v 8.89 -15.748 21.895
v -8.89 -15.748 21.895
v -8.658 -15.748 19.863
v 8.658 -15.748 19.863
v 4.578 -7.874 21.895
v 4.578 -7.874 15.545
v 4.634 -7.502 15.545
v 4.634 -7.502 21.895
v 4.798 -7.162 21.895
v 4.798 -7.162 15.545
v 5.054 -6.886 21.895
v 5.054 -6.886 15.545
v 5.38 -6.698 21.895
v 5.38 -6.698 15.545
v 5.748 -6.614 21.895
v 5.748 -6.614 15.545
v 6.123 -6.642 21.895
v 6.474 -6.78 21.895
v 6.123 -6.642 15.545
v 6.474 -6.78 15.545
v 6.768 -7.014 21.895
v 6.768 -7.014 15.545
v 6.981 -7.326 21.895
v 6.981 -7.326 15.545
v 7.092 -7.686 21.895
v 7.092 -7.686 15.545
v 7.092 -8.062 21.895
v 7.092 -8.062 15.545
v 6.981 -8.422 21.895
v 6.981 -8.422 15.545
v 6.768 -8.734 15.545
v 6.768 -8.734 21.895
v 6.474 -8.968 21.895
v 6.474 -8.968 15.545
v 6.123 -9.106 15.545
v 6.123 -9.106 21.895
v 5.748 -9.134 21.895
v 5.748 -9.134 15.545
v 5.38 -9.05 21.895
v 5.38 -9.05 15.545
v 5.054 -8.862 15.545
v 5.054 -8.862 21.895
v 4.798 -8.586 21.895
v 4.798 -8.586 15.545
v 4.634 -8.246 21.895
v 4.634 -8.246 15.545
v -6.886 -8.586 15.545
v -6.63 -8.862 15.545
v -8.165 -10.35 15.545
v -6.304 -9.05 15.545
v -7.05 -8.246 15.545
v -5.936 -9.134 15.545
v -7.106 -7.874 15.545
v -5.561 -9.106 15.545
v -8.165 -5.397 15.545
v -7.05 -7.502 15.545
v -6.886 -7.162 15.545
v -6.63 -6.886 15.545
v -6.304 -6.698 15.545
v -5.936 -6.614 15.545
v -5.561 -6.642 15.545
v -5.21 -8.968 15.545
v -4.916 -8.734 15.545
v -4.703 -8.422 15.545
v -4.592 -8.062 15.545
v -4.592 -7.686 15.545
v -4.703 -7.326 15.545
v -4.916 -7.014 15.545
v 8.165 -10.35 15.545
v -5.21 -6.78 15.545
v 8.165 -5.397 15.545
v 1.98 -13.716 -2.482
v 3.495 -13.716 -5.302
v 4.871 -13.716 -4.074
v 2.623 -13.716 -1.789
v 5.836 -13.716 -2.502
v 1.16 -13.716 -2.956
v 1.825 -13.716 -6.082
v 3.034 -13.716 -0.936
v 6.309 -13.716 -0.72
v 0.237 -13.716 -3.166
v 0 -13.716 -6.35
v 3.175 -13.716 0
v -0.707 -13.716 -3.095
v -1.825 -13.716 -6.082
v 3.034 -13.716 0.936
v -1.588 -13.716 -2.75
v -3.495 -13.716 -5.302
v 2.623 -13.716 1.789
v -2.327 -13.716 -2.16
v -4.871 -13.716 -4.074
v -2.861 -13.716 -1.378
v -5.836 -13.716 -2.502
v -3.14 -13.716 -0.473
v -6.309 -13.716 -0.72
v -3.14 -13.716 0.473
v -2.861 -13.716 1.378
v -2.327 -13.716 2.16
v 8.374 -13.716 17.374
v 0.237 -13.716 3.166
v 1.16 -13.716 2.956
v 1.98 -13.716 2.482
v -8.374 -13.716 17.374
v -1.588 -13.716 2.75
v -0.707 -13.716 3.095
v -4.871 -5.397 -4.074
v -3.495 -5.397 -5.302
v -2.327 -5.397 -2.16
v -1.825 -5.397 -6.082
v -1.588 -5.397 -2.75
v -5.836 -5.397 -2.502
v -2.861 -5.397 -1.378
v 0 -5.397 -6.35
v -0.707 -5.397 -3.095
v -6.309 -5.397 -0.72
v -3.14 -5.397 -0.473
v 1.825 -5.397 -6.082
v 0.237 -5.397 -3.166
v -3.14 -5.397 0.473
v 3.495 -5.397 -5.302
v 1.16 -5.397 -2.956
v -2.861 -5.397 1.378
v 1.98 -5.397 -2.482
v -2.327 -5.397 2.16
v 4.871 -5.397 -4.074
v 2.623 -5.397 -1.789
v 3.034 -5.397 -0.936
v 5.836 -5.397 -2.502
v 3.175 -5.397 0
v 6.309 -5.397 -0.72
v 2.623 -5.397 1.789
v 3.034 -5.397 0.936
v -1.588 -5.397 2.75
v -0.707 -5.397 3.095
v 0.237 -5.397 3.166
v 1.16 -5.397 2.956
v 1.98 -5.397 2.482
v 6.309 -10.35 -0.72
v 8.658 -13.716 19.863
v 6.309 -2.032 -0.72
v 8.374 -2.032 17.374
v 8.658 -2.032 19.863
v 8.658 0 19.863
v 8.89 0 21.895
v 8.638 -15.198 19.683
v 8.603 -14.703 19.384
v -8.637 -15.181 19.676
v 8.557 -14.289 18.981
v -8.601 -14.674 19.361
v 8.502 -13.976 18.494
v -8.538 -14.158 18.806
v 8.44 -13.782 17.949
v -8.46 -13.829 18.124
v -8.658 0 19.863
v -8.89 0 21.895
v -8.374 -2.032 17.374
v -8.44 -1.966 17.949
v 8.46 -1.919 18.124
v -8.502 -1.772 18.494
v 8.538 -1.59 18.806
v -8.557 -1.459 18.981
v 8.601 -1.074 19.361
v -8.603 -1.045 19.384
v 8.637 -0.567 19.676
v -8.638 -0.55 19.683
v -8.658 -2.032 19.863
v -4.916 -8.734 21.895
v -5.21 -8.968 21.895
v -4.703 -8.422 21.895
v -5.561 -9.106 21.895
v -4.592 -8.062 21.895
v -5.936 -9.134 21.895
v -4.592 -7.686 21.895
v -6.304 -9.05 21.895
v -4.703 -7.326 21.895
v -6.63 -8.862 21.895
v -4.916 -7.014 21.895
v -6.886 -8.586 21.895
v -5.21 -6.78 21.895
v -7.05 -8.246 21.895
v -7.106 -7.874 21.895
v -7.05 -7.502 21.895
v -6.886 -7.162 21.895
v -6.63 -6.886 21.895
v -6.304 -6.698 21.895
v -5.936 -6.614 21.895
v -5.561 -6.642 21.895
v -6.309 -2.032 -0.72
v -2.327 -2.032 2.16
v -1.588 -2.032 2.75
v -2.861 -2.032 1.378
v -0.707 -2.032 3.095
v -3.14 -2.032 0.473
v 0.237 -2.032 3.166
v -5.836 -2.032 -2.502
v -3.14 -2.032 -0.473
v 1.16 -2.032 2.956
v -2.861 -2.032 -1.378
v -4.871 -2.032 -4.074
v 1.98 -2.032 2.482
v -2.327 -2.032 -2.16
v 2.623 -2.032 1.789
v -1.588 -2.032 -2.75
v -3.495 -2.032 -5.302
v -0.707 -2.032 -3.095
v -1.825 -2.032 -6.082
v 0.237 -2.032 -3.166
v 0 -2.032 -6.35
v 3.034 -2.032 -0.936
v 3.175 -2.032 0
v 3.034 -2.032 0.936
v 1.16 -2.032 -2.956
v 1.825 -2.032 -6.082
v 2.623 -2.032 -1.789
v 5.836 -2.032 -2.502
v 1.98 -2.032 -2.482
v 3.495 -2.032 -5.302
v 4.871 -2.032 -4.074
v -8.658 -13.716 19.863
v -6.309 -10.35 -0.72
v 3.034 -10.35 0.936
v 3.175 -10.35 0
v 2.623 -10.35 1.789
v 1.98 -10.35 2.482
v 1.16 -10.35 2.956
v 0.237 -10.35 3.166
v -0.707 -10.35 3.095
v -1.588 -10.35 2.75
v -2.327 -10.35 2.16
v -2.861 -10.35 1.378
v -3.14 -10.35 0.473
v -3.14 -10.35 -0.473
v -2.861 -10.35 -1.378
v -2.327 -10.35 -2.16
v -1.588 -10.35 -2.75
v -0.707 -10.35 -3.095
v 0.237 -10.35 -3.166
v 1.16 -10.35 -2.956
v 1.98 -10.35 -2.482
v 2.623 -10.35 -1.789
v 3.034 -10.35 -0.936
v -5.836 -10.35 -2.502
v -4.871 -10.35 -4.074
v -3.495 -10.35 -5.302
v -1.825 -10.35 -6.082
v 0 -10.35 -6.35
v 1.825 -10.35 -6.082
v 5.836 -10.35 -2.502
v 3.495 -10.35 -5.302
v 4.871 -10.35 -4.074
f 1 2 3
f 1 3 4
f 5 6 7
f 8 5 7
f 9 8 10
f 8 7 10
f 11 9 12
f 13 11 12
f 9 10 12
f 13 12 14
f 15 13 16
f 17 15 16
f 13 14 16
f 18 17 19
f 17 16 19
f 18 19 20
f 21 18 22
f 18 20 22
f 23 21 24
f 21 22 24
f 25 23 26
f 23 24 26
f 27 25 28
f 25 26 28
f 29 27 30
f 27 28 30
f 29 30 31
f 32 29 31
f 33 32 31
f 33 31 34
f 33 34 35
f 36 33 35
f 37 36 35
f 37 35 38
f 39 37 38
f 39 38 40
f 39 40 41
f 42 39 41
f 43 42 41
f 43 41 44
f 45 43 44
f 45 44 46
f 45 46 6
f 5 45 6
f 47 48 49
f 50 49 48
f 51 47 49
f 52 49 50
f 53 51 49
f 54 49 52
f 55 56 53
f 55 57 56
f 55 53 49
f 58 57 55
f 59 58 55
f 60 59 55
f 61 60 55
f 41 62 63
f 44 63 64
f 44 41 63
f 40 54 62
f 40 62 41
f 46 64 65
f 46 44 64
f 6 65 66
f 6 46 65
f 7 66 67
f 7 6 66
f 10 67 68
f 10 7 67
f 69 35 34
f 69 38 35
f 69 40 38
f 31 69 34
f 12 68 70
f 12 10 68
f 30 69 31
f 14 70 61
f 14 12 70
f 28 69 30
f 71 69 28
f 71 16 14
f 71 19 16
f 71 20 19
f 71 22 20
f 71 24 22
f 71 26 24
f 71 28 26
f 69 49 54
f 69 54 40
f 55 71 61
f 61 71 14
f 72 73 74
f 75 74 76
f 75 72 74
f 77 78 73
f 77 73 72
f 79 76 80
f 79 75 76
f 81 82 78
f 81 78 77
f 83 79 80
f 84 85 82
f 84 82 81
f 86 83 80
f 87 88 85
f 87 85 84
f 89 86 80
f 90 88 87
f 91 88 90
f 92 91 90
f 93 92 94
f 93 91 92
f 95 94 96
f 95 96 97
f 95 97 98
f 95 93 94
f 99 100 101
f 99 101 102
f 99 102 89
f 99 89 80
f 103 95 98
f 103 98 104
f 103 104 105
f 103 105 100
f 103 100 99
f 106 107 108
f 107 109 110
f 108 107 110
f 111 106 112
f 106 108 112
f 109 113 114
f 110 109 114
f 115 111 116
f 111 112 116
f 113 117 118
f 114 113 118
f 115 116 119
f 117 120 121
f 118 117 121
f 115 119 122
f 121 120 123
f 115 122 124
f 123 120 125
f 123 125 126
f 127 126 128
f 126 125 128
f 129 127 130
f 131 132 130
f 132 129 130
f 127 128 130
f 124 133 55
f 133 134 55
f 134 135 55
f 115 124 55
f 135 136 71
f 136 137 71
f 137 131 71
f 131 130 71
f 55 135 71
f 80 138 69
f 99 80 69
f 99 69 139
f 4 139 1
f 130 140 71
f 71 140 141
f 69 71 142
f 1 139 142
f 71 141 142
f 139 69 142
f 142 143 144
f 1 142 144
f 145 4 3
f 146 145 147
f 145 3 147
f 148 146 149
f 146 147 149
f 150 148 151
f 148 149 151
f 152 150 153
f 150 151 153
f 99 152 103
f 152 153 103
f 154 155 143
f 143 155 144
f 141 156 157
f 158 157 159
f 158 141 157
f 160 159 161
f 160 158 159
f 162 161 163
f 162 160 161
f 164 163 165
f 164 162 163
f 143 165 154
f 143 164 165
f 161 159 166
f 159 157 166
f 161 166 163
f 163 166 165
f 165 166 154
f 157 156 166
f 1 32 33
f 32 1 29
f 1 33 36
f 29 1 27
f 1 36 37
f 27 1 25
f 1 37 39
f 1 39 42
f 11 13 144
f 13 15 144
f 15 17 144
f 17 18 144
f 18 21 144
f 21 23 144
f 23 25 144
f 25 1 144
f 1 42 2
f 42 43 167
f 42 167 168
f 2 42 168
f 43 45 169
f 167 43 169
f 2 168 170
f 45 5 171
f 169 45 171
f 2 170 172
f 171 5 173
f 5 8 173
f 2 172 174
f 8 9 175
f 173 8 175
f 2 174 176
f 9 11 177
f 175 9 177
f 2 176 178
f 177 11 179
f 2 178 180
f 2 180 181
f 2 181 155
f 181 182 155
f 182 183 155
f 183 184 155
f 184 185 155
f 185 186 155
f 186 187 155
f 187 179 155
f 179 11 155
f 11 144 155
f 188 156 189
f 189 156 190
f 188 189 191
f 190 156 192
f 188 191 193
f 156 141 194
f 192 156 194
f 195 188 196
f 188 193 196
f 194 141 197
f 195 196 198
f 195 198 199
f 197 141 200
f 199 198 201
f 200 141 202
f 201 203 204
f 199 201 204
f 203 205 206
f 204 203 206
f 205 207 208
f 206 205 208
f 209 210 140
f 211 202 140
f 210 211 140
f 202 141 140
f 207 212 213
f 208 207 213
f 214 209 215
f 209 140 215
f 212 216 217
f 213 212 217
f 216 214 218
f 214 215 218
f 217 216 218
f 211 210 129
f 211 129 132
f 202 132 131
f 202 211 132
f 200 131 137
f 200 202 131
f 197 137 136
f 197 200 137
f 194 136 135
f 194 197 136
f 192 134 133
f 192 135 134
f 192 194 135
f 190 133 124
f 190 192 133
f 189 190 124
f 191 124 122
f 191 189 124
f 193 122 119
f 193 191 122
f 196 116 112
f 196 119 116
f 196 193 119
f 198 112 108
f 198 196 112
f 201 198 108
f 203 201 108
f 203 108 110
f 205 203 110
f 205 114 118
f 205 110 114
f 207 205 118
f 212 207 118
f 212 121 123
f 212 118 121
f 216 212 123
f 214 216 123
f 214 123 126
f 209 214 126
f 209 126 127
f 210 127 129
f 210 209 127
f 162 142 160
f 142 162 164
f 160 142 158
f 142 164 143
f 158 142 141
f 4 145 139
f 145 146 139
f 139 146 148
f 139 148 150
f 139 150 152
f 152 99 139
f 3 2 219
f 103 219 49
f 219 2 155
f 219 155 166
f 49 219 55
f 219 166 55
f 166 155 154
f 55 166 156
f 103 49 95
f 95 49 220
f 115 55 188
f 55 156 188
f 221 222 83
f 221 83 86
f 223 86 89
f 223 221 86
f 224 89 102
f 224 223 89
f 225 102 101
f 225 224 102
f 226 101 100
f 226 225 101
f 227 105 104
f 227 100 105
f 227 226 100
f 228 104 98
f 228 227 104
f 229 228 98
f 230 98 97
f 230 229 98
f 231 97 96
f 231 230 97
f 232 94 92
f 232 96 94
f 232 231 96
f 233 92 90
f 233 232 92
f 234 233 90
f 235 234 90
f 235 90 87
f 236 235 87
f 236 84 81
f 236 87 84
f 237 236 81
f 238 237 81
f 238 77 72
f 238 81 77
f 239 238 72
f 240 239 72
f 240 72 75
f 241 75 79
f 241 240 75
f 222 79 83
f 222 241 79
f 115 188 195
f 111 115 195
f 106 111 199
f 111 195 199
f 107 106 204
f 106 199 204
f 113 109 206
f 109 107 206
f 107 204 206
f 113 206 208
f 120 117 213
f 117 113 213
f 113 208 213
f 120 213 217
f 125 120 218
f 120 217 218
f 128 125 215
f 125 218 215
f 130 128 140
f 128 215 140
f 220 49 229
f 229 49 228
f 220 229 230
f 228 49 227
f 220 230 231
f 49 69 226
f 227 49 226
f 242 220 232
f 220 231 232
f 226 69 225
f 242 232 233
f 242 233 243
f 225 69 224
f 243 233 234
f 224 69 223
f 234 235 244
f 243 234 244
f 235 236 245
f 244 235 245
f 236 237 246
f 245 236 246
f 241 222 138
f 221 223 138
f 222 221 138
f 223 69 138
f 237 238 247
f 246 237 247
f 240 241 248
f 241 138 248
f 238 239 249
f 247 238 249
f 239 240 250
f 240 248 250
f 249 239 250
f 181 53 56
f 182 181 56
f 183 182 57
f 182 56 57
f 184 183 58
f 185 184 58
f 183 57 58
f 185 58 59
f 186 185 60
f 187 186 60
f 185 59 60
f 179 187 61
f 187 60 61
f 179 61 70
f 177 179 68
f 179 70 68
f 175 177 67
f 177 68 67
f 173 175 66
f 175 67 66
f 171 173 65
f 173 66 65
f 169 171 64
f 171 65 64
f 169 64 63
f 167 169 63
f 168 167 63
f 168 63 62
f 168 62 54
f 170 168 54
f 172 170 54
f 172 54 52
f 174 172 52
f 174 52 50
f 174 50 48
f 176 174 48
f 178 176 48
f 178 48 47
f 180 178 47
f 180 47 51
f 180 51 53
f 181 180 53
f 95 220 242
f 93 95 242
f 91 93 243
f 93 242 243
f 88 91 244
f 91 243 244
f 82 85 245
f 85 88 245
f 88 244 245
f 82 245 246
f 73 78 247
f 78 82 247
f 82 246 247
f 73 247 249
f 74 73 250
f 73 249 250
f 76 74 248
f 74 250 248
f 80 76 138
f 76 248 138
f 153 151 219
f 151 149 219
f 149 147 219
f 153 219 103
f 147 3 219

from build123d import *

# Parameters (mm, degrees)
F0_R         = 3.175
F1_DEPTH     = 15.748
F2_W         = 4.953
F2_H         = 16.2648302115
F2_H_2       = 7.994236929
F3_DEPTH     = 12.7
F2_W_2       = 2.032
F2_H_3       = 20.5828301237
F4_DEPTH     = 12.7
F5_T4_DEPTH  = 29.7595972634
F5_T10_DEPTH = 29.7595972634
F7_D         = 2.5273


# Not quite as in the source:
# - a fillet or chamfer that OpenCascade refuses, or shapes differently, is made with other operations: its cross-section is extruded or revolved along the edge and cut away or added


with BuildPart() as f1:
    # F0 (on Front) → F1 (new body)
    with BuildSketch(Plane.XZ):
        with BuildLine():
            Line((-8.89, 21.8948), (-6.3090456189, -0.7200301237))
            ThreePointArc((-6.3090456189, -0.7200301237), (0, -6.35), (6.3090456189, -0.7200301237))
            Line((6.3090456189, -0.7200301237), (8.89, 21.8948))
            Line((8.89, 21.8948), (-8.89, 21.8948))
        make_face()
        Circle(F0_R, mode=Mode.SUBTRACT)
    extrude(amount=F1_DEPTH)

    # F2 (on Right) → F3 (cut, symmetric)
    with BuildSketch(Plane.YZ):
        with Locations((-7.874, 7.4123849821)):
            Rectangle(F2_W, F2_H)
        with Locations((-7.874, -4.7171485882)):
            Rectangle(F2_W, F2_H_2)
    extrude(amount=F3_DEPTH, both=True, mode=Mode.SUBTRACT)

    # F2 (on Right) → F4 (cut, symmetric)
    with BuildSketch(Plane.YZ):
        with Locations((-14.732, -4.7171485882)):
            Rectangle(F2_W_2, F2_H_2)
        with Locations((-1.016, -4.7171485882)):
            Rectangle(F2_W_2, F2_H_2)
        with Locations((-1.016, 9.5713849382)):
            Rectangle(F2_W_2, F2_H_3)
        with Locations((-14.732, 9.5713849382)):
            Rectangle(F2_W_2, F2_H_3)
    extrude(amount=F4_DEPTH, both=True, mode=Mode.SUBTRACT)

    # F5: fillet of radius 2.54 on 2 edges, made by hand


with BuildPart() as f5_tool2:
    # F5_s3 → F5_t4 (new body)
    with BuildSketch(Plane.YZ.offset(-14.8797986317)):
        with BuildLine():
            ThreePointArc((-15.748, 19.8628), (-14.2885244601, 18.9805554727), (-13.716, 17.3741184213))
            Line((-13.716, 17.3741184213), (-13.716, 19.8628))
            Line((-13.716, 19.8628), (-15.748, 19.8628))
        make_face()
    extrude(amount=F5_T4_DEPTH)

    split(bisect_by=Plane(origin=(6.3090456189, 0, -0.7200301237), x_dir=(0, 1, 0), z_dir=(-0.9935504912, 0, 0.1133905707)), keep=Keep.TOP)

    split(bisect_by=Plane(origin=(-6.3090456189, 0, -0.7200301237), x_dir=(0, 1, 0), z_dir=(0.9935504912, 0, 0.1133905707)), keep=Keep.TOP)


with BuildPart() as f1_1:
    add(f1.part)

    # F5_t1: union F5_tool2
    add(f5_tool2.part)


with BuildPart() as f5_tool8:
    # F5_s9 → F5_t10 (new body)
    with BuildSketch(Plane.YZ.offset(14.8797986317)):
        with BuildLine():
            ThreePointArc((-2.032, 17.3741184213), (-1.4594755399, 18.9805554727), (0, 19.8628))
            Line((0, 19.8628), (-2.032, 19.8628))
            Line((-2.032, 19.8628), (-2.032, 17.3741184213))
        make_face()
    extrude(amount=-F5_T10_DEPTH)

    split(bisect_by=Plane(origin=(6.3090456189, 0, -0.7200301237), x_dir=(0, 1, 0), z_dir=(-0.9935504912, 0, 0.1133905707)), keep=Keep.TOP)

    split(bisect_by=Plane(origin=(-6.3090456189, 0, -0.7200301237), x_dir=(0, 1, 0), z_dir=(0.9935504912, 0, 0.1133905707)), keep=Keep.TOP)


with BuildPart() as f1_2:
    add(f1_1.part)

    # F5_t7: union F5_tool8
    add(f5_tool8.part)

    # F7 (through all)
    with Locations(Plane.XY.offset(21.8948)):
        with Locations((-5.842, -7.874), (5.842, -7.874)):
            Hole(F7_D / 2)


solid = f1_2.part
